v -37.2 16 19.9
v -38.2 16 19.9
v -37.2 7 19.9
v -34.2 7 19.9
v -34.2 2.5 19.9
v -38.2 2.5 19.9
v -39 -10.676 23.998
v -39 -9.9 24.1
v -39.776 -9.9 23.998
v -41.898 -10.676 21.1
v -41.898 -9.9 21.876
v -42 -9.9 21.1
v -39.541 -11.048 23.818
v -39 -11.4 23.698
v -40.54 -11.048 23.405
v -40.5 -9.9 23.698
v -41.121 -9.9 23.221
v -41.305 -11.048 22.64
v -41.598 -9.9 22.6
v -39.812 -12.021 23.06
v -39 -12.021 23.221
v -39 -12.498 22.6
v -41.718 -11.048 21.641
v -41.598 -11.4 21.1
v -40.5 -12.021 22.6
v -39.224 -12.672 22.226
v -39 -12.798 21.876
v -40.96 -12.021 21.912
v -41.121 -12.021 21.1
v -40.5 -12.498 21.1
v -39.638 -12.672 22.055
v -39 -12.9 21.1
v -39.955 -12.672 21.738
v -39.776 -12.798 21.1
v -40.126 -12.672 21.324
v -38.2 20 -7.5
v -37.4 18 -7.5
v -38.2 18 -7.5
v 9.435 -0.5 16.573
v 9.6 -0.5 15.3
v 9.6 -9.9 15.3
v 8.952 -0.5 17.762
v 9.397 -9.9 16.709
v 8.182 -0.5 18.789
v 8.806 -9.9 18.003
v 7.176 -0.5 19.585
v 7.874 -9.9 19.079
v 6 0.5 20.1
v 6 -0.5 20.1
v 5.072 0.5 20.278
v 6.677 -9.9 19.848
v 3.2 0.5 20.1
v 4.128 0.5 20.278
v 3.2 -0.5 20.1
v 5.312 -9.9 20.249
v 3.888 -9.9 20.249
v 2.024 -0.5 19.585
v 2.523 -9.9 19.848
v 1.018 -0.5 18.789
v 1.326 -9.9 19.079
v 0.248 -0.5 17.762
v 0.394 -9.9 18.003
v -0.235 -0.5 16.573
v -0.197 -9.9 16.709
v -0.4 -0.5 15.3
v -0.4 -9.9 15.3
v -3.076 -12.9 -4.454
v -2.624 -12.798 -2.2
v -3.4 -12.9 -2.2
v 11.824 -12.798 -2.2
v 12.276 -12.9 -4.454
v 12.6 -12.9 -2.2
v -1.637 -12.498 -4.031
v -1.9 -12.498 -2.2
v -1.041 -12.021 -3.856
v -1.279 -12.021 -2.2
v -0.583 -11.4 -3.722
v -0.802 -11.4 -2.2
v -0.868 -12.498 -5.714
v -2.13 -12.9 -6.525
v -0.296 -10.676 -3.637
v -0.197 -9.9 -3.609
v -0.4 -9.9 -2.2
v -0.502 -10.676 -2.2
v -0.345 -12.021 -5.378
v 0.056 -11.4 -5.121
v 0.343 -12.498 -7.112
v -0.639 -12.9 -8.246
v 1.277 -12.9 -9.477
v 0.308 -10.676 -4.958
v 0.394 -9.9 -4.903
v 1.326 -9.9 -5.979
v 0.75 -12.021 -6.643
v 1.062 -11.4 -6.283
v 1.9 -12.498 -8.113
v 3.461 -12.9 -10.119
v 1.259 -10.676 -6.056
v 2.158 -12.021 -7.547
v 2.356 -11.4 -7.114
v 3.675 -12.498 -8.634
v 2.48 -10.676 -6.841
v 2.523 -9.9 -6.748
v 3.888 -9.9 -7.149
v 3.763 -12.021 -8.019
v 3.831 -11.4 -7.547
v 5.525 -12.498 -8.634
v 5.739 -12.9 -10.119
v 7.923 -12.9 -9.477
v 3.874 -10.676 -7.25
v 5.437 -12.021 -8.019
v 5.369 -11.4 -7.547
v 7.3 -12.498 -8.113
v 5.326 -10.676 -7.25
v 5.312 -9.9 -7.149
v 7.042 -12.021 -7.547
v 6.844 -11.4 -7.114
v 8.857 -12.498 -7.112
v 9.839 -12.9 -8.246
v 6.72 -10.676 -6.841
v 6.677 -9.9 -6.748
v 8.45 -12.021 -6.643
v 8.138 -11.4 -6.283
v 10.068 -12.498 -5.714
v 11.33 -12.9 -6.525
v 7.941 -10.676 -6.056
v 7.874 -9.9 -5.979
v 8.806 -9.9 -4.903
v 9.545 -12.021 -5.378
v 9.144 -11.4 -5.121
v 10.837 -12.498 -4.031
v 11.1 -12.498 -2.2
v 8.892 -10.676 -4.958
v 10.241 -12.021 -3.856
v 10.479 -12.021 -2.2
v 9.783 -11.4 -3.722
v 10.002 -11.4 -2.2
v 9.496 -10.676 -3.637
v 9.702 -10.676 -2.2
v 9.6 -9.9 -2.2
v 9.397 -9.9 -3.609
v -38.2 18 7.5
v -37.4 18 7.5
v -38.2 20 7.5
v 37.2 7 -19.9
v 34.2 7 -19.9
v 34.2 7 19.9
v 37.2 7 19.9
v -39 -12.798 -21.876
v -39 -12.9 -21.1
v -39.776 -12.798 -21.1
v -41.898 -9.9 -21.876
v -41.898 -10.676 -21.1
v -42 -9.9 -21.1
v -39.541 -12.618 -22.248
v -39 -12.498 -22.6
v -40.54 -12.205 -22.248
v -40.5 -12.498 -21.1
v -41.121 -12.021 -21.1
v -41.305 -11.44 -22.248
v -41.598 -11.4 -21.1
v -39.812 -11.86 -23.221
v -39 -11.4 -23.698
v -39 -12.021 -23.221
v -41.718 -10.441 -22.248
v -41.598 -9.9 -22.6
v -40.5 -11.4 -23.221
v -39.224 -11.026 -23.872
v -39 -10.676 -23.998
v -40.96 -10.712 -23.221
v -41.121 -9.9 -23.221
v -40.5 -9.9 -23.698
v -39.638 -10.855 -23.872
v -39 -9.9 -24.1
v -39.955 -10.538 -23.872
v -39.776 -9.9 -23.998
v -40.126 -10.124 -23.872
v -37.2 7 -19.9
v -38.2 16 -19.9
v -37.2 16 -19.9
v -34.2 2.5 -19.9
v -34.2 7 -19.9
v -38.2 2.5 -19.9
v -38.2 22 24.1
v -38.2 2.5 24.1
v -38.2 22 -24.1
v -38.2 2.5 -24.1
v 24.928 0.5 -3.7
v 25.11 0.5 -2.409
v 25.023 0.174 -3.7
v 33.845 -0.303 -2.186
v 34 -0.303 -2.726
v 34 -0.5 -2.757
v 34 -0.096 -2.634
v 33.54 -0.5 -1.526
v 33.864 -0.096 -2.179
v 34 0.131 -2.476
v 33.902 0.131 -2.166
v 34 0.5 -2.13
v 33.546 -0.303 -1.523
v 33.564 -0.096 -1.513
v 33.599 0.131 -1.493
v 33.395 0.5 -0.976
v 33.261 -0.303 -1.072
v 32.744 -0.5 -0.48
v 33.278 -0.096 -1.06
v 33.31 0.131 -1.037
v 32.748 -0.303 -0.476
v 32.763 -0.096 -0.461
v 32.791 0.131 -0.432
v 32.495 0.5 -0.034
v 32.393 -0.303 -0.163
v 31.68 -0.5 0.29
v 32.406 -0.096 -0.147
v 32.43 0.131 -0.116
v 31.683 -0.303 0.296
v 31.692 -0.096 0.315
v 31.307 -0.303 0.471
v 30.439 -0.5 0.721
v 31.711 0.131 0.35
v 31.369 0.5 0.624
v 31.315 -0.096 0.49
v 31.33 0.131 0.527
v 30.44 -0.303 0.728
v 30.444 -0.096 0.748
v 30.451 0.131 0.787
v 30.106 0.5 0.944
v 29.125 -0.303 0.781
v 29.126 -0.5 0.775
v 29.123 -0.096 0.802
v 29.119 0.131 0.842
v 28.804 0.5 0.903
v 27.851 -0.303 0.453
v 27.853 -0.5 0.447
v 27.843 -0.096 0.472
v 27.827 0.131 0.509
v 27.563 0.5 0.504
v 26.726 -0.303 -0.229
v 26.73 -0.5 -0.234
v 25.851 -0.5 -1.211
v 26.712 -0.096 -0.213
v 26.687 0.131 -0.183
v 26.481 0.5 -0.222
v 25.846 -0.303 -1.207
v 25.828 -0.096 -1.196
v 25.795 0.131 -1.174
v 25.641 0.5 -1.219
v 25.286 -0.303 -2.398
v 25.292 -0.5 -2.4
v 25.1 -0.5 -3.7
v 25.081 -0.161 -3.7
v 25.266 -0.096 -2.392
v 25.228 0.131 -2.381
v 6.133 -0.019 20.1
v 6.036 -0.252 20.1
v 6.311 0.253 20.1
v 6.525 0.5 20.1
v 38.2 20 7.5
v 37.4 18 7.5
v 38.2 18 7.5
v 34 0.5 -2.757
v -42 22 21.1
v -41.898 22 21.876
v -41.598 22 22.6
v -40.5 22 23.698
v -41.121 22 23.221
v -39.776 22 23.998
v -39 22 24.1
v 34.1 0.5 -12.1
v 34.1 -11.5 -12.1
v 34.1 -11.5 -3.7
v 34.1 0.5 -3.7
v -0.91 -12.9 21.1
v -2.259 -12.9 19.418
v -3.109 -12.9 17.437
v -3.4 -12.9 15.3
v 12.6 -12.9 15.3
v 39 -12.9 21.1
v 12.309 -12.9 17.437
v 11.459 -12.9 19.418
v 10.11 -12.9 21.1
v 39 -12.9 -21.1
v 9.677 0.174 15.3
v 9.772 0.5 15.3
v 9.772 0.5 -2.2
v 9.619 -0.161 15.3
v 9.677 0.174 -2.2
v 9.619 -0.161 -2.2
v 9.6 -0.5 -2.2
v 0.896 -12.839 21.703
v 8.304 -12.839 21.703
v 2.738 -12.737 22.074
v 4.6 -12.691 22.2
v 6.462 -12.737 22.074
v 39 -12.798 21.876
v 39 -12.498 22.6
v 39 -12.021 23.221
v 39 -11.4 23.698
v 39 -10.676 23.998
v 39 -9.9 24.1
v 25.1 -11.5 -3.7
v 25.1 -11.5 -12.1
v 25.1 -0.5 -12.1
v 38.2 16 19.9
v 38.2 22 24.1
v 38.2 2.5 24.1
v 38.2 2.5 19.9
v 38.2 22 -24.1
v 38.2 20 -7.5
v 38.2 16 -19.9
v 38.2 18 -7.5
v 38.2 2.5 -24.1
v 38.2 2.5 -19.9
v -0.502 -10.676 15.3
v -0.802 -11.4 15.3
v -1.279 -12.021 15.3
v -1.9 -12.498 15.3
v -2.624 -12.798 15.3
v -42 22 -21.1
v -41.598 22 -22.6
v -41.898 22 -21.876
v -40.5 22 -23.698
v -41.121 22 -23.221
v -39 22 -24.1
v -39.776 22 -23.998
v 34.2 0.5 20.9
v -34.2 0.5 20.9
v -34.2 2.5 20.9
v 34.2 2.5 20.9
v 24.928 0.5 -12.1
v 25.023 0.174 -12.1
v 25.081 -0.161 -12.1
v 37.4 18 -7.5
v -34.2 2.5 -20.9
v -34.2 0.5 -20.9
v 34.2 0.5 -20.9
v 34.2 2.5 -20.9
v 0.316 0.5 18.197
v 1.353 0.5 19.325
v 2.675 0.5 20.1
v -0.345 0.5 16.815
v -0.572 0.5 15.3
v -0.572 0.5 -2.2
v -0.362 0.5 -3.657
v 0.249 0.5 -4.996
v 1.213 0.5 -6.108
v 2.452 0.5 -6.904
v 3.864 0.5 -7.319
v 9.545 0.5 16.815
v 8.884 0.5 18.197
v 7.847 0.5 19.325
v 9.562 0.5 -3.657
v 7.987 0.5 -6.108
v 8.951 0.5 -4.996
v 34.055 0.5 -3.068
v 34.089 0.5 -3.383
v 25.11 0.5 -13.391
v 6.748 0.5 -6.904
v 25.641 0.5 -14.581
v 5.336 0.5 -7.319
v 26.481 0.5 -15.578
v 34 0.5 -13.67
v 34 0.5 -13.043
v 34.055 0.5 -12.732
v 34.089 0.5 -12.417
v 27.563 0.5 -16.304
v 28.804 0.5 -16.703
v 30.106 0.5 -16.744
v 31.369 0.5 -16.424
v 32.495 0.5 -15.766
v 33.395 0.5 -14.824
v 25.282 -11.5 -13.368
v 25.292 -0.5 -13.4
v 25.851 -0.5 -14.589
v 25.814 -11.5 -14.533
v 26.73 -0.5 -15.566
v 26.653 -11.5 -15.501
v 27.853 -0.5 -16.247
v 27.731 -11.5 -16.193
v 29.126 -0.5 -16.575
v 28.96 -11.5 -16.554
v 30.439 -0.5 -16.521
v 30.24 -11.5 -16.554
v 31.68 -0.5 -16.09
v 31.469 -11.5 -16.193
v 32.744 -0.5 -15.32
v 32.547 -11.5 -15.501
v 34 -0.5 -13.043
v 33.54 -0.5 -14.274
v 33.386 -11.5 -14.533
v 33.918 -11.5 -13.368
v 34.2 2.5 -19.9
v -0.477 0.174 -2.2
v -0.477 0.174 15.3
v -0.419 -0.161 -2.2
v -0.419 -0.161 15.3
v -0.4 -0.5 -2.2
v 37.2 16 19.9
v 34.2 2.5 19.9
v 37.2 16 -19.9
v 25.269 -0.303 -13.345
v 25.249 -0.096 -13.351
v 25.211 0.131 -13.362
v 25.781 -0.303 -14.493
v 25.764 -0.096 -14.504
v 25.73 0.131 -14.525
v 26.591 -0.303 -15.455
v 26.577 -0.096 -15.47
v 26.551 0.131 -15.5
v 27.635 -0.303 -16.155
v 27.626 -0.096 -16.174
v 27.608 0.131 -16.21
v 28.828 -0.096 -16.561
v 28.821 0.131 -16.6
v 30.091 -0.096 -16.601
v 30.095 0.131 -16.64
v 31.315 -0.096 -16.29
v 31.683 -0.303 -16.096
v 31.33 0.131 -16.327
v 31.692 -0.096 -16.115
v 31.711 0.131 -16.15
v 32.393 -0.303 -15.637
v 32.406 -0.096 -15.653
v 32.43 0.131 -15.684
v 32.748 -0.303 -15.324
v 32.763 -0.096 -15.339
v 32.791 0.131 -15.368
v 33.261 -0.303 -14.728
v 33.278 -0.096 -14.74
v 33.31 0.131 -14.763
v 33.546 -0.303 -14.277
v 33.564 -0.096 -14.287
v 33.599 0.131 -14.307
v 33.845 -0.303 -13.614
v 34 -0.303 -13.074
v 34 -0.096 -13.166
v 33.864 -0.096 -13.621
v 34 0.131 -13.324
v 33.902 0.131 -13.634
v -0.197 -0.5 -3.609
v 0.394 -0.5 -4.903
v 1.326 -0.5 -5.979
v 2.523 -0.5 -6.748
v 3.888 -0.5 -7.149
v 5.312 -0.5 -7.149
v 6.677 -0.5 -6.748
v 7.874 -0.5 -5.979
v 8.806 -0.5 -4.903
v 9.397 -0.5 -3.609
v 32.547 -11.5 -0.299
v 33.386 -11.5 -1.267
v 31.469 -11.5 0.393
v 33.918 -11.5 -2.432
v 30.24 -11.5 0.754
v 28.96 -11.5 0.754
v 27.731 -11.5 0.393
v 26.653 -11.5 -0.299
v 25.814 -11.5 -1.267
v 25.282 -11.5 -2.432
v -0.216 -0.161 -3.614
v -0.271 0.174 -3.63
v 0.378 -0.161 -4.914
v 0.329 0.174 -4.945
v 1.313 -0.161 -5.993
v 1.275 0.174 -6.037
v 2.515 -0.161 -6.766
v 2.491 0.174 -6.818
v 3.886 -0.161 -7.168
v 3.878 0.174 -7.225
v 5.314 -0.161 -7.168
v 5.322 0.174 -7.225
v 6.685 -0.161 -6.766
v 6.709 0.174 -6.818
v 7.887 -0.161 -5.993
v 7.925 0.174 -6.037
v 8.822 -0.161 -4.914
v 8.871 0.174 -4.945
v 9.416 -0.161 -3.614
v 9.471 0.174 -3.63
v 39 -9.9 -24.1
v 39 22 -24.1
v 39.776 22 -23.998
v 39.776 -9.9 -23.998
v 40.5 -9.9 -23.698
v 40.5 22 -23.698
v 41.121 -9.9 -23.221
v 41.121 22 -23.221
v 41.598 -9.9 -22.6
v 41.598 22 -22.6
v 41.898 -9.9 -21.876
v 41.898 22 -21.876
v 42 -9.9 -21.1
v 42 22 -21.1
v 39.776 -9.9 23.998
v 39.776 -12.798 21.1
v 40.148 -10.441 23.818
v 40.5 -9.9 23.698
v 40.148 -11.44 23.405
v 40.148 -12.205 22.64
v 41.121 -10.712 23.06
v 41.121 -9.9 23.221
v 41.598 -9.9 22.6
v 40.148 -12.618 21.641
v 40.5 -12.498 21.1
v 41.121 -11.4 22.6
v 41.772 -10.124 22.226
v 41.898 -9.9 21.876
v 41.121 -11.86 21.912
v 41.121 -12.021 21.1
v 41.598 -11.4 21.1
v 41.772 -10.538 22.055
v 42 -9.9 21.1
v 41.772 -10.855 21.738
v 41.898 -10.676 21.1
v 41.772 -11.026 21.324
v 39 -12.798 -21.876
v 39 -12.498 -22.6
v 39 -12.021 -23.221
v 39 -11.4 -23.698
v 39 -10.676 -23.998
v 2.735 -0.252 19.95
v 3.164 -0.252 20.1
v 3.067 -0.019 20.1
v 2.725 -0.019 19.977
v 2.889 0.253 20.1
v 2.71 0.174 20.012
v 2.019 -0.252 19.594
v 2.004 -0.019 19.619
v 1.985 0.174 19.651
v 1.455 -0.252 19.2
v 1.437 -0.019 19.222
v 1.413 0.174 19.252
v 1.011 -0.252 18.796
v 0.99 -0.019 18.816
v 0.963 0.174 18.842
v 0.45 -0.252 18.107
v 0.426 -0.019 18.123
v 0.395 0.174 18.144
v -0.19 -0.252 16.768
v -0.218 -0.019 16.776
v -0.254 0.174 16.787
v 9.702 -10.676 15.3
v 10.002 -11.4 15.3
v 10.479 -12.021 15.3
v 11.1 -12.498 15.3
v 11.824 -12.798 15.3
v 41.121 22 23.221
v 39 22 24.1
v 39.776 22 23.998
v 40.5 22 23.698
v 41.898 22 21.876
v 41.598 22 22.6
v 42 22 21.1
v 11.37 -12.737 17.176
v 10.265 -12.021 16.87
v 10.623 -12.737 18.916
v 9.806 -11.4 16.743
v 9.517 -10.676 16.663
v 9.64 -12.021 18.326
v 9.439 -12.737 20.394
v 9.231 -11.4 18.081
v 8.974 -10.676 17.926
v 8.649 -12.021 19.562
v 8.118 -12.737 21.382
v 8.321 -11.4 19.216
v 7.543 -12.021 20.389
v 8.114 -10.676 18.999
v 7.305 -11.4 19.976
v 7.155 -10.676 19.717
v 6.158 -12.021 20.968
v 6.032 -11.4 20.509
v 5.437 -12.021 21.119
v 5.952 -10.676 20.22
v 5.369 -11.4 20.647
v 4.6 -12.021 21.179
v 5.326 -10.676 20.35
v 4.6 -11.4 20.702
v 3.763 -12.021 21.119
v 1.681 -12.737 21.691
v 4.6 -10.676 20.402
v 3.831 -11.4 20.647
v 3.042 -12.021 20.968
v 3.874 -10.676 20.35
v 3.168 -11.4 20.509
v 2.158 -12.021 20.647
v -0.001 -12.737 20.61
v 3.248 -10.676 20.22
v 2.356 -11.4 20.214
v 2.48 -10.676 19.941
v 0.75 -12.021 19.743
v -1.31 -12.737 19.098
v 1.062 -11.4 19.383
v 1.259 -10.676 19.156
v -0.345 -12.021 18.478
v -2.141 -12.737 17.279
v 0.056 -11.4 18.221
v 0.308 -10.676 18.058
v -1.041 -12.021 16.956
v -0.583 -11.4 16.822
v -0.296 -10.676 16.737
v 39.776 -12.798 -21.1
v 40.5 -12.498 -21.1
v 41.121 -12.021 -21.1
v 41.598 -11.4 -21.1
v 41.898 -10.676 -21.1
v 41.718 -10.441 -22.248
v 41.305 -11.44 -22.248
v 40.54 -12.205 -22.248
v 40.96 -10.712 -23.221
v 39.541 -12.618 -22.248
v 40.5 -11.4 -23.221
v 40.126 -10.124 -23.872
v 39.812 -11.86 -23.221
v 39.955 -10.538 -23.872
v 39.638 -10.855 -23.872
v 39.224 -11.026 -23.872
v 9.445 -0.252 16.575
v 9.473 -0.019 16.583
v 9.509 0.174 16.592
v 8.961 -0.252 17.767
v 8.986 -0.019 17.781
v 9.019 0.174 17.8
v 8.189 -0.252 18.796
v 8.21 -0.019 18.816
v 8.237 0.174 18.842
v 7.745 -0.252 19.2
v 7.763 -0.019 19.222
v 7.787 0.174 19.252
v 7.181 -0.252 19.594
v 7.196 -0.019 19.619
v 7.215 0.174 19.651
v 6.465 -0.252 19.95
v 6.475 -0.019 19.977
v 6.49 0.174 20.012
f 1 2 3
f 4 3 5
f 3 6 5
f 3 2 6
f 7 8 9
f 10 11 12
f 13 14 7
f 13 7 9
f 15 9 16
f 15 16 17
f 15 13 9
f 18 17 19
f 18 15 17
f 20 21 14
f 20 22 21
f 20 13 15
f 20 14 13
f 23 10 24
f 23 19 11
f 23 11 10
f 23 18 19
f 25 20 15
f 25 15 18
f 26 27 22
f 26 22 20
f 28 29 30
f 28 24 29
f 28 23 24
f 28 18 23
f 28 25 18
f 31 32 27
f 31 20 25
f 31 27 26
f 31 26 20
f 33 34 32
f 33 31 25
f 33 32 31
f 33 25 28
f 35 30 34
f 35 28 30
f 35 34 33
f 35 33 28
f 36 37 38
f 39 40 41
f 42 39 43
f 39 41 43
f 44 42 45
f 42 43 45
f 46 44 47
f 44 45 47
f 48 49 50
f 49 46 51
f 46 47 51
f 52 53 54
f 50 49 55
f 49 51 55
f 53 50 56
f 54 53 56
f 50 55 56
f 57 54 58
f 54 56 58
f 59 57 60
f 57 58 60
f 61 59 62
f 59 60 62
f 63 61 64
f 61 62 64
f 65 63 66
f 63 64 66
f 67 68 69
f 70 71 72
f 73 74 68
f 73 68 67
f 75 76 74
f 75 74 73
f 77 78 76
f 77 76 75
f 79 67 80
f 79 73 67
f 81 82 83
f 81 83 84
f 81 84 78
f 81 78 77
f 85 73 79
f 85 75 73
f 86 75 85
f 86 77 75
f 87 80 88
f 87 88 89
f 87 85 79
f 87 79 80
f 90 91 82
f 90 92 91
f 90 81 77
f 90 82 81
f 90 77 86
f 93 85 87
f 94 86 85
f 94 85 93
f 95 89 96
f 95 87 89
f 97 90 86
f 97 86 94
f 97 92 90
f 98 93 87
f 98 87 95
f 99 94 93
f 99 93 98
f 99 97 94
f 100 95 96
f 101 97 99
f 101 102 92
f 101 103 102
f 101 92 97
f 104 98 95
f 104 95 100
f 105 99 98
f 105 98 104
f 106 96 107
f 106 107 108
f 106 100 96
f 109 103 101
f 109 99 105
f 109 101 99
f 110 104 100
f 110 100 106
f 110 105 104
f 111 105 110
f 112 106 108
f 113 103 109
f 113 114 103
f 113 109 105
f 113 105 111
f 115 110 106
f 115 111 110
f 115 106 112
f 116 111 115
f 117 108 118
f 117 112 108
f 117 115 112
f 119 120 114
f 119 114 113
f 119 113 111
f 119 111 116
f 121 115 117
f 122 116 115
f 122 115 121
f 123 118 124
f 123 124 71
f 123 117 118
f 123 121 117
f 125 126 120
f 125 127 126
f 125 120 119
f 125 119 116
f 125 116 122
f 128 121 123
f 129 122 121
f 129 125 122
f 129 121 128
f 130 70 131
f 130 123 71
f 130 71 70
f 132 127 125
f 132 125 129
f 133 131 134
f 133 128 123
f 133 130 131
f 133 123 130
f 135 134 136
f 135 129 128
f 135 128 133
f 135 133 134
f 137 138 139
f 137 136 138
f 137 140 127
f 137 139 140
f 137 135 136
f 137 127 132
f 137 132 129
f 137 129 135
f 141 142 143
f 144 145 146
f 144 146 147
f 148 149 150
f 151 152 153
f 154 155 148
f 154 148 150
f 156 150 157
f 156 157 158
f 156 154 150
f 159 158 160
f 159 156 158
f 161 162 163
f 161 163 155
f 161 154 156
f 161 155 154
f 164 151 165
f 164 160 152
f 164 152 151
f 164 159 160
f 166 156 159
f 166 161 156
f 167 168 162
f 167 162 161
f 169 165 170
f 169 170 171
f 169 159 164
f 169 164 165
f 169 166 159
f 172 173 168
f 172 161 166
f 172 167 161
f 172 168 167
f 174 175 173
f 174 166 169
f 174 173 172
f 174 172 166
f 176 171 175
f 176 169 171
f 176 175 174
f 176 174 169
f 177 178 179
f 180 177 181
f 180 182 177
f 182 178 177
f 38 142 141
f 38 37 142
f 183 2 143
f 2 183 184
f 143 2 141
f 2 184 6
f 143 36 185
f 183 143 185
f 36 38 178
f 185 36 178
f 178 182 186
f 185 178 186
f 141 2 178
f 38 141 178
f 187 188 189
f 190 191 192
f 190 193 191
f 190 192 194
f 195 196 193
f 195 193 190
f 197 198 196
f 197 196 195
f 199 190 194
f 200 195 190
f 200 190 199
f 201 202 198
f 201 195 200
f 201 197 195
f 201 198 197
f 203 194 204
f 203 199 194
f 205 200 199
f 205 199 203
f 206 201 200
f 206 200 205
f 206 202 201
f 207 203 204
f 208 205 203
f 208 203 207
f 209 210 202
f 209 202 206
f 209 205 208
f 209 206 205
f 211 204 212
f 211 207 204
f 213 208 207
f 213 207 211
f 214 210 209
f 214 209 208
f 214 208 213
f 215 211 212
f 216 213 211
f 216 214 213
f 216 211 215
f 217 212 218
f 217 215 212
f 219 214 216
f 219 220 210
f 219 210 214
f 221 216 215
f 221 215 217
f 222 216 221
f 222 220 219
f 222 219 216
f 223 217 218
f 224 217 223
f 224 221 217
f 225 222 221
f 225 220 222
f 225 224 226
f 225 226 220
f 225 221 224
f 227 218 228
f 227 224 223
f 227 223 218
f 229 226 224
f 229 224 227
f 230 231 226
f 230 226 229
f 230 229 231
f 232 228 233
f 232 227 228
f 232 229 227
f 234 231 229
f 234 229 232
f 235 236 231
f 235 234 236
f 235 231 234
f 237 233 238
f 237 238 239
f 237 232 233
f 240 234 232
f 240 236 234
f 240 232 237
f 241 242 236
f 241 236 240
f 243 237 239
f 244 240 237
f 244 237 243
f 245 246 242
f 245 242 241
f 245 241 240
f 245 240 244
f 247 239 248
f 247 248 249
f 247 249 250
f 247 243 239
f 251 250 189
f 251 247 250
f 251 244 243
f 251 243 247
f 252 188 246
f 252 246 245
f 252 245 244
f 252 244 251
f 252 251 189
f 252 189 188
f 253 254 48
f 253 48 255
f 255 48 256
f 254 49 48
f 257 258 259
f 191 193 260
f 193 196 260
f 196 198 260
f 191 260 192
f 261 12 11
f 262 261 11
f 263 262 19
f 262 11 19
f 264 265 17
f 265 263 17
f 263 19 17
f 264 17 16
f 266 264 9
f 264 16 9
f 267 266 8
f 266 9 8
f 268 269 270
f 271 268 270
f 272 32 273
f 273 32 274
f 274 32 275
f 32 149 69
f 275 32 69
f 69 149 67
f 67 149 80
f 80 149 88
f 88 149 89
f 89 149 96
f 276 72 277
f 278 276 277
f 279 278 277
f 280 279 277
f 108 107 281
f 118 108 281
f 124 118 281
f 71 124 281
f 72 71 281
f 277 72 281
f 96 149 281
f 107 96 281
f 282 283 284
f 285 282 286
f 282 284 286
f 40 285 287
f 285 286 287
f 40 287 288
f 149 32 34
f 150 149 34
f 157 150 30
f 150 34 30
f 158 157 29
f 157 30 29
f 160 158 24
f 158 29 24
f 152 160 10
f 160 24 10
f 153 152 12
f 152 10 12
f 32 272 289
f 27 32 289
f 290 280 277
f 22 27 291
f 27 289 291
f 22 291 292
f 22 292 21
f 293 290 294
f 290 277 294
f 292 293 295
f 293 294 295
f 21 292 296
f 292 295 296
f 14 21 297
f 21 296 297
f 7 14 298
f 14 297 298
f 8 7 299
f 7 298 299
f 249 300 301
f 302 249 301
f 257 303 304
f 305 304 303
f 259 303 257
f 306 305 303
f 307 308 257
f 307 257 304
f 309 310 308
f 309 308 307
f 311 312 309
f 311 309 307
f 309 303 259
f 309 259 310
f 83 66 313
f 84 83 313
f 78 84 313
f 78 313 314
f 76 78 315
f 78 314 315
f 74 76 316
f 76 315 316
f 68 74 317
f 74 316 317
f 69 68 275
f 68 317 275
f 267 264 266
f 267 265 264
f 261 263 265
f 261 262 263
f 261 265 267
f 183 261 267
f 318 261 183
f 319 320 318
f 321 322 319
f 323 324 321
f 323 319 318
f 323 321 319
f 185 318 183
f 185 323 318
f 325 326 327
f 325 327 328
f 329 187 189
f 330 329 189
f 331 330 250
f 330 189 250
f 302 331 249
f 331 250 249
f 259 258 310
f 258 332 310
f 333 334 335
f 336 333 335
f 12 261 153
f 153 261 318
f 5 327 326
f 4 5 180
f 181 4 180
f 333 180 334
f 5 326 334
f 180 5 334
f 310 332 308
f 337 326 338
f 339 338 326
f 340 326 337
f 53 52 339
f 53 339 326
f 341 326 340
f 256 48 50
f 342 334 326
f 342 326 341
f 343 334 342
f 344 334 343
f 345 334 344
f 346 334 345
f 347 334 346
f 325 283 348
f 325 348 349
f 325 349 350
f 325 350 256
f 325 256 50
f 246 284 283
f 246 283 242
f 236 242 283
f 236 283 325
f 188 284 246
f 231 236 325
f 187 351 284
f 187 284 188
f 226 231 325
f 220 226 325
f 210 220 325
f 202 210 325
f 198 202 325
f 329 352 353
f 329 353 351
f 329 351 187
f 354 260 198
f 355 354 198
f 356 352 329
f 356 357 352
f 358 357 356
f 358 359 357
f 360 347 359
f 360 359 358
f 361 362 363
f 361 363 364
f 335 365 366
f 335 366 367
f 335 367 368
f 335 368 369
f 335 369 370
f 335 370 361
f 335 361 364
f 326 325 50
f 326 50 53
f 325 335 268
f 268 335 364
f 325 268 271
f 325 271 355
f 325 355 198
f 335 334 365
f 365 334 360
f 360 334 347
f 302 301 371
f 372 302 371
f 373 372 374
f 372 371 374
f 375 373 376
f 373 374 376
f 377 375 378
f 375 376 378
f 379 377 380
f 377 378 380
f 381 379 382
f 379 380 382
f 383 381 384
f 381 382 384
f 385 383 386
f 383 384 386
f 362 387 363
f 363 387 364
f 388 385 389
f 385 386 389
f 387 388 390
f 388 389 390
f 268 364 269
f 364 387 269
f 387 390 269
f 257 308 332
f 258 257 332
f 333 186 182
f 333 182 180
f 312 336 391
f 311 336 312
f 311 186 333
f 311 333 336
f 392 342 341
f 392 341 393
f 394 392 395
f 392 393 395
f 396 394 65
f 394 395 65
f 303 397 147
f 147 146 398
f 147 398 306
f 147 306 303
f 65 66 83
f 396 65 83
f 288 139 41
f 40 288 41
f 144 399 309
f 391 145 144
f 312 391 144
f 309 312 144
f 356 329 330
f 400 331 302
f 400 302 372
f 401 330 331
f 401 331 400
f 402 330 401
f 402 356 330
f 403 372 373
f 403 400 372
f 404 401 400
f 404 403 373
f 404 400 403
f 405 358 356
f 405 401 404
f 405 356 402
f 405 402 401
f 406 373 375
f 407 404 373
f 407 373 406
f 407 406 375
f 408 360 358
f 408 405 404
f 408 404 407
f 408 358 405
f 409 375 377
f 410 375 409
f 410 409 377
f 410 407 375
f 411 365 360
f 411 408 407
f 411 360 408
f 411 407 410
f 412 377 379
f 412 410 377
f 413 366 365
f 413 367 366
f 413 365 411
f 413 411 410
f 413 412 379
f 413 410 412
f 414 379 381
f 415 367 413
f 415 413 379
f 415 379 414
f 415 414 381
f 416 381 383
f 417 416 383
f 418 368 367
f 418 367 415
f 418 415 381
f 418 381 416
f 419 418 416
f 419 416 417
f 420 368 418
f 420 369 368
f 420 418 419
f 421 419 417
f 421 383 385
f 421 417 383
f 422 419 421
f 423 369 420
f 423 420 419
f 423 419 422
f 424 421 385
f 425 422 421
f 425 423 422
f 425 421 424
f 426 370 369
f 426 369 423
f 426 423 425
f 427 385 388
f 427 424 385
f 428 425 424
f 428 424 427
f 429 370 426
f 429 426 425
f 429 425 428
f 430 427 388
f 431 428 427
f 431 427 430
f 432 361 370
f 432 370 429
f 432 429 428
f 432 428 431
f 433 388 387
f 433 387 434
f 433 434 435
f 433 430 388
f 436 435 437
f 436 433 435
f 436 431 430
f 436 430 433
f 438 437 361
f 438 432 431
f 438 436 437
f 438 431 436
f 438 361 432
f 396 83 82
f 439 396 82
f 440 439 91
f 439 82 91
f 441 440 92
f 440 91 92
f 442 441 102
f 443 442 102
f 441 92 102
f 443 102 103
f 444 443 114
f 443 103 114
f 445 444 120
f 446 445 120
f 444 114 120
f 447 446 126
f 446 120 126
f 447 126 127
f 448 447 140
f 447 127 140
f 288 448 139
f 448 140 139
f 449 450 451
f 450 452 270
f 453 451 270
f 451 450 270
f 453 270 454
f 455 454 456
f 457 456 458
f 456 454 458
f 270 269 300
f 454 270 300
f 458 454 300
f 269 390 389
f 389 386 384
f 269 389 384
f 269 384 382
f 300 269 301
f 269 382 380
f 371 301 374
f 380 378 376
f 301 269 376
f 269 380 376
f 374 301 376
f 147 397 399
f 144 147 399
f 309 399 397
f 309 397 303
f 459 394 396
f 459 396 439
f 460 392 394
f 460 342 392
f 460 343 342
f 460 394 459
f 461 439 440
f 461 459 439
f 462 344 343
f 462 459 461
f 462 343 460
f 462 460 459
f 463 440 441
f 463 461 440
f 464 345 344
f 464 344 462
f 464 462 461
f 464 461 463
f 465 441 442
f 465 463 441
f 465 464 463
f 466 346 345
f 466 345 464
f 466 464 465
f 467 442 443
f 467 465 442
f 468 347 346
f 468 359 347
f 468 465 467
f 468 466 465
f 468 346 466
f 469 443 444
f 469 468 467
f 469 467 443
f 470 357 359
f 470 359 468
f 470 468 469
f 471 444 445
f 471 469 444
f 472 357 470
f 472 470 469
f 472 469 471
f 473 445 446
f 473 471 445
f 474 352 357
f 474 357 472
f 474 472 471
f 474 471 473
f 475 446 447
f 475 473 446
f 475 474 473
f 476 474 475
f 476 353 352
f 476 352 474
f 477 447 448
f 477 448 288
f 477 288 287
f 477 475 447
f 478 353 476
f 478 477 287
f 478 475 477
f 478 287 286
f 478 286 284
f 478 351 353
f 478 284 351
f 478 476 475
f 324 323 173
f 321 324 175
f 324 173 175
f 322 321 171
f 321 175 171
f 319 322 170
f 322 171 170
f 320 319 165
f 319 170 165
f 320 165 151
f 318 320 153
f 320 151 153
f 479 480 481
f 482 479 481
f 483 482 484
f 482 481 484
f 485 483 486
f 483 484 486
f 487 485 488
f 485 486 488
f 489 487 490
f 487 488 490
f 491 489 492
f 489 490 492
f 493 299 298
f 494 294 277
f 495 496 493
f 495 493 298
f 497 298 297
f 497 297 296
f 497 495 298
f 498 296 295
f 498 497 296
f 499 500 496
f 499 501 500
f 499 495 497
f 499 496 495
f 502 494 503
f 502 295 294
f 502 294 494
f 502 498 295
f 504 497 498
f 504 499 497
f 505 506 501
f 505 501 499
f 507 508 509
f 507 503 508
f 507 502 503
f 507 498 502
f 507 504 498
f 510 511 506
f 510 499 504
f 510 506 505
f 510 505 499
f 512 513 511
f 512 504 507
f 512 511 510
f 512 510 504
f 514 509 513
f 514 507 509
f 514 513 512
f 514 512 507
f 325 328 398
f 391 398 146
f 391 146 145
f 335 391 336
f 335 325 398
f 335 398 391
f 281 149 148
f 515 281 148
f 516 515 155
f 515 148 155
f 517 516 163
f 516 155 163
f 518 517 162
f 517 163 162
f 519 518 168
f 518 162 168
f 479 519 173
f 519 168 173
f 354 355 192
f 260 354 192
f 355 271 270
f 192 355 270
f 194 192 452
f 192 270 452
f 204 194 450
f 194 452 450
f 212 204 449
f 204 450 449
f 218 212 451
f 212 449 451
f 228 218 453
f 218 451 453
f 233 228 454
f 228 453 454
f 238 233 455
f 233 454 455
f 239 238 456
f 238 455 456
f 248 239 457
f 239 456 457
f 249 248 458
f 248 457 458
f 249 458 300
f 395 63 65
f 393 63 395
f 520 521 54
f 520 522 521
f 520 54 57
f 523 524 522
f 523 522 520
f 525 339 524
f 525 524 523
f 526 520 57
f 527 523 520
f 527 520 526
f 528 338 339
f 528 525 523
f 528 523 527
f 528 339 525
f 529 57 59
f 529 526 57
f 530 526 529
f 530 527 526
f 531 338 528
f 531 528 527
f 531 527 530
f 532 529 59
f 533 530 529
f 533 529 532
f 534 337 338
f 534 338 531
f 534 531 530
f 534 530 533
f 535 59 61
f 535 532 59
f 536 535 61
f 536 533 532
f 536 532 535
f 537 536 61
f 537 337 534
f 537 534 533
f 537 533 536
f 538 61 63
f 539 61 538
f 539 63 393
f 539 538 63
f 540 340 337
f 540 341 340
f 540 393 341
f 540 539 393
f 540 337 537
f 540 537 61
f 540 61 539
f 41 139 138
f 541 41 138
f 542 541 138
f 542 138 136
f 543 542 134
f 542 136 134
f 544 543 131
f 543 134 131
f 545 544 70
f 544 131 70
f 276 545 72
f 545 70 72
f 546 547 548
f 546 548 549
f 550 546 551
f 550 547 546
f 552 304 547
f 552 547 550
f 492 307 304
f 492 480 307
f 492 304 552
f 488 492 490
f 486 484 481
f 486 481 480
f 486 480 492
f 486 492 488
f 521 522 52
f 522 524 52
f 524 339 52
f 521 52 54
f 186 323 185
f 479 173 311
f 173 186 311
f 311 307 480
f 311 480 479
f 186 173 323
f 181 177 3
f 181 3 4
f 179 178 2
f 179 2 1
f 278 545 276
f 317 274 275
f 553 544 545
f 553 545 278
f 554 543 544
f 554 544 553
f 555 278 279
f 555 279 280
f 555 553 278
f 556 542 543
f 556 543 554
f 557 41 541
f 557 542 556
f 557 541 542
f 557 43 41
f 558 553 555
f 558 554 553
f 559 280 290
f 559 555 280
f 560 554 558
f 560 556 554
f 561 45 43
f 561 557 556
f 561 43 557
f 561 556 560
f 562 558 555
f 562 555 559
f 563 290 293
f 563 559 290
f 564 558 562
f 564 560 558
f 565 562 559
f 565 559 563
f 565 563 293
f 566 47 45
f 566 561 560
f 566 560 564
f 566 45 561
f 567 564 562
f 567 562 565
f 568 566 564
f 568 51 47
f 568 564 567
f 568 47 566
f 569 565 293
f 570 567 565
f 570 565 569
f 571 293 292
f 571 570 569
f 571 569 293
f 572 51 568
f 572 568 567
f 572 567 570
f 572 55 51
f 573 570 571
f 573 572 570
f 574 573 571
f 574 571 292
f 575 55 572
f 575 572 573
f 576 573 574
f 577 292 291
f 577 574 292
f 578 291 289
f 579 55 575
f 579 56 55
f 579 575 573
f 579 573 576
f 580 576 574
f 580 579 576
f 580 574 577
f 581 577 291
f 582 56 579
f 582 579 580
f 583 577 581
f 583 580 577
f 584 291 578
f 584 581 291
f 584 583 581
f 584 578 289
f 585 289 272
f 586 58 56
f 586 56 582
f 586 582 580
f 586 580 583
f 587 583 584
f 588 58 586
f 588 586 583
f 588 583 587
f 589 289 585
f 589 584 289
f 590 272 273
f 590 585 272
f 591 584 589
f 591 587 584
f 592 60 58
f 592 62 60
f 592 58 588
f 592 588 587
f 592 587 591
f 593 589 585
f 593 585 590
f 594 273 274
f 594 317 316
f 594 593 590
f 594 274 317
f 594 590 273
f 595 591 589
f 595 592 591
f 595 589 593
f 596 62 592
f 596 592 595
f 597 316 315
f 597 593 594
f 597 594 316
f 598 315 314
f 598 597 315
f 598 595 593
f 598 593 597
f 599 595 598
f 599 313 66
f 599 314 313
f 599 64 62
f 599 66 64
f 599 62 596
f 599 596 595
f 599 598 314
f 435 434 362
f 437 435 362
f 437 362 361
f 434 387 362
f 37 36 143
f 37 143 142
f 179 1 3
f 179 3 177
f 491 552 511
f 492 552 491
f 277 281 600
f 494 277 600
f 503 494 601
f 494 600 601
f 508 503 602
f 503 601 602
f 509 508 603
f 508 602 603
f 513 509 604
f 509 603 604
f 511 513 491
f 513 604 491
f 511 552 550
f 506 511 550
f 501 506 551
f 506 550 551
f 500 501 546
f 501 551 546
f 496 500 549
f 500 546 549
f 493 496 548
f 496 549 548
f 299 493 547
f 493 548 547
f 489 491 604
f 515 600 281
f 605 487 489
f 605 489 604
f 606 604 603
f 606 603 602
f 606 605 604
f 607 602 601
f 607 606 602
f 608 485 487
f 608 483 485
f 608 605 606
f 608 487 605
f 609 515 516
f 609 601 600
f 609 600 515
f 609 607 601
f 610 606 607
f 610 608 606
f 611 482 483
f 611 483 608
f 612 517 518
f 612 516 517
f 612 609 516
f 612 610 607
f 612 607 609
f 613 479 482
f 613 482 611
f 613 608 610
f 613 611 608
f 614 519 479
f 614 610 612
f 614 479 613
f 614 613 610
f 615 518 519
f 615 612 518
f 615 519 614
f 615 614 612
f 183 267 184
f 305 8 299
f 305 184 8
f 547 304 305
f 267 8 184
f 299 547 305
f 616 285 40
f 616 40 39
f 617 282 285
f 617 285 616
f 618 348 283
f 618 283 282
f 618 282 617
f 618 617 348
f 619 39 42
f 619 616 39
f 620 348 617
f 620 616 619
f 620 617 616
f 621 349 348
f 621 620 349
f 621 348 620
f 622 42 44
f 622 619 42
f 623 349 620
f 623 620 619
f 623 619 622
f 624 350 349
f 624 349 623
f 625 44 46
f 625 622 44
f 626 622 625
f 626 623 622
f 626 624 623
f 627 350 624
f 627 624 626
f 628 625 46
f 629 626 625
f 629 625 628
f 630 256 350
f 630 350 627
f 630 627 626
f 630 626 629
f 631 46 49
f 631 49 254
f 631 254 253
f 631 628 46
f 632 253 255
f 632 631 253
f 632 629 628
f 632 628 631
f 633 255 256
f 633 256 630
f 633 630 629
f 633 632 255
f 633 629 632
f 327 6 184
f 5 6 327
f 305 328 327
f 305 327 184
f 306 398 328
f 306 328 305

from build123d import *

# Parameters (mm, degrees)
SKETCH2_W               = 84
SKETCH2_H               = 48.2
BOSS_EXTRUDE1_DEPTH     = 3
SKETCH3_W               = 3.8
SKETCH3_H               = 48.2
BOSS_EXTRUDE2_DEPTH     = 19
SKETCH4_W               = 4
SKETCH4_H               = 48.2
BOSS_EXTRUDE3_DEPTH     = 13
BOSS_EXTRUDE4_DEPTH     = 7.5
SKETCH6_W               = 3
SKETCH6_H               = 48.2
CUT_EXTRUDE1_DEPTH      = 9
SKETCH7_W               = 68
SKETCH7_H               = 40.2
CUT_EXTRUDE2_DEPTH      = 0.5
SKETCH9_W               = 84
SKETCH9_H               = 48.2
BOSS_EXTRUDE5_DEPTH     = 15.4
CUT_EXTRUDE3_DEPTH      = 53.202107237
CUT_EXTRUDE3_DEPTH_BACK = 14
CUT_EXTRUDE4_DEPTH      = 53.202107237
CUT_EXTRUDE4_DEPTH_BACK = 53.202107237
FILLET1_R               = 3
SKETCH12_W              = 76.4
SKETCH12_H              = 4.2
CUT_EXTRUDE5_DEPTH      = 20
CUT_EXTRUDE6_DEPTH      = 53.202107283
CUT_EXTRUDE6_DEPTH_BACK = 2
SKETCH13_W              = 68.4
SKETCH13_H              = 41.8


with BuildPart() as part:
    # Sketch2 → Boss-Extrude1 (new body)
    with BuildSketch(Plane(origin=(0, 0, 0), x_dir=(1, 0, 0), z_dir=(0, 1, 0))):
        Rectangle(SKETCH2_W, SKETCH2_H)
    extrude(amount=BOSS_EXTRUDE1_DEPTH)

    # Sketch3 → Boss-Extrude2 (add)
    with BuildSketch(Plane(origin=(0, 3, 0), x_dir=(1, 0, 0), z_dir=(0, 1, 0))):
        with Locations((-40.1, 0)):
            Rectangle(SKETCH3_W, SKETCH3_H)
        with Locations((40.1, 0)):
            Rectangle(SKETCH3_W, SKETCH3_H)
    extrude(amount=BOSS_EXTRUDE2_DEPTH)

    # Sketch4 → Boss-Extrude3 (add)
    with BuildSketch(Plane(origin=(0, 3, 0), x_dir=(1, 0, 0), z_dir=(0, 1, 0))):
        with Locations((-36.2, 0)):
            Rectangle(SKETCH4_W, SKETCH4_H)
        with Locations((36.2, 0)):
            Rectangle(SKETCH4_W, SKETCH4_H)
    extrude(amount=BOSS_EXTRUDE3_DEPTH)

    # Sketch5 → Boss-Extrude4 (add, symmetric)
    with BuildSketch(Plane(origin=(0, 0, 0), x_dir=(-1, 0, 0), z_dir=(0, 0, -1))):
        Polygon((-38.2, 20), (-37.4, 18), (-38.2, 18), align=None)
    boss_extrude4 = extrude(amount=BOSS_EXTRUDE4_DEPTH, both=True)

    # Sketch6 → Cut-Extrude1 (cut)
    with BuildSketch(Plane(origin=(0, 16, 0), x_dir=(1, 0, 0), z_dir=(0, 1, 0))):
        with Locations((35.7, 0)):
            Rectangle(SKETCH6_W, SKETCH6_H)
        with Locations((-35.7, 0)):
            Rectangle(SKETCH6_W, SKETCH6_H)
    extrude(amount=-CUT_EXTRUDE1_DEPTH, mode=Mode.SUBTRACT)

    # Mirror1: Boss-Extrude4 across plane
    add(boss_extrude4.mirror(Plane(origin=(0, 0, 0), x_dir=(0, 0, 1), z_dir=(1, 0, 0))))

    # Sketch7 → Cut-Extrude2 (cut)
    with BuildSketch(Plane(origin=(0, 3, 0), x_dir=(1, 0, 0), z_dir=(0, 1, 0))):
        Rectangle(SKETCH7_W, SKETCH7_H)
    extrude(amount=-CUT_EXTRUDE2_DEPTH, mode=Mode.SUBTRACT)

    # Sketch9 → Boss-Extrude5 (add)
    with BuildSketch(Plane(origin=(0, 2.5, 0), x_dir=(1, 0, 0), z_dir=(0, 1, 0))):
        Rectangle(SKETCH9_W, SKETCH9_H)
    extrude(amount=-BOSS_EXTRUDE5_DEPTH)

    # Sketch10 → Cut-Extrude3 (cut, two sides: drawn at the far end of the back side and taken through both)
    with BuildSketch(Plane(origin=(0, 2.5, 0), x_dir=(1, 0, 0), z_dir=(0, 1, 0)).offset(-CUT_EXTRUDE3_DEPTH_BACK)):
        with BuildLine():
            Line((25.1, 3.7), (25.1, 12.1))
            ThreePointArc((25.1, 12.1), (29.6, 16.6), (34.1, 12.1))
            Line((34.1, 12.1), (34.1, 3.7))
            ThreePointArc((34.1, 3.7), (29.6, -0.8), (25.1, 3.7))
        make_face()
    extrude(amount=CUT_EXTRUDE3_DEPTH + CUT_EXTRUDE3_DEPTH_BACK, mode=Mode.SUBTRACT)

    # Sketch11 → Cut-Extrude4 (cut, two sides: drawn at the far end of the back side and taken through both)
    with BuildSketch(Plane(origin=(0, 2.5, 0), x_dir=(1, 0, 0), z_dir=(0, 1, 0)).offset(-CUT_EXTRUDE4_DEPTH_BACK)):
        with BuildLine():
            Line((9.6, 2.2), (9.6, -15.3))
            ThreePointArc((9.6, -15.3), (4.6, -20.3), (-0.4, -15.3))
            Line((-0.4, -15.3), (-0.4, 2.2))
            ThreePointArc((-0.4, 2.2), (4.6, 7.2), (9.6, 2.2))
        make_face()
    extrude(amount=CUT_EXTRUDE4_DEPTH + CUT_EXTRUDE4_DEPTH_BACK, mode=Mode.SUBTRACT)

    # Fillet1
    # the kernel refuses this fillet: 3 mm, written as the material it takes off along each edge
    with BuildSketch(Plane(origin=(-39, -9.9, 21.1), x_dir=(-1, 0, 0), z_dir=(0, -1, 0))) as fillet1_piece_1_section:
        Polygon((0, 0), (FILLET1_R * 1.02, 0), (FILLET1_R * 1.02, -FILLET1_R * 1.02), (0, -FILLET1_R * 1.02), align=None)
    fillet1_piece_1 = extrude(amount=FILLET1_R * 1.02, mode=Mode.PRIVATE)
    fillet1_piece_1 = fillet1_piece_1 - Plane(origin=(-39, -9.9, 21.1), x_dir=(0.7071067811865475, 0, -0.7071067811865476), z_dir=(0, -1, 0)) * Sphere(FILLET1_R, mode=Mode.PRIVATE)
    add(fillet1_piece_1, mode=Mode.SUBTRACT)
    with BuildSketch(Plane(origin=(-39, -9.9, -21.1), x_dir=(0, -1, 0), z_dir=(0, 0, -1))) as fillet1_piece_2_section:
        Polygon((0, 0), (FILLET1_R * 1.02, 0), (FILLET1_R * 1.02, FILLET1_R * 1.02), (0, FILLET1_R * 1.02), align=None)
    fillet1_piece_2 = extrude(amount=FILLET1_R * 1.02, mode=Mode.PRIVATE)
    fillet1_piece_2 = fillet1_piece_2 - Plane(origin=(-39, -9.9, -21.1), x_dir=(0.7071067811865475, 0.7071067811865475, 0), z_dir=(0, 0, -1)) * Sphere(FILLET1_R, mode=Mode.PRIVATE)
    add(fillet1_piece_2, mode=Mode.SUBTRACT)
    with BuildSketch(Plane(origin=(39, -9.9, -21.1), x_dir=(0, -1, 0), z_dir=(0, 0, -1))) as fillet1_piece_3_section:
        Polygon((0, 0), (FILLET1_R * 1.02, 0), (FILLET1_R * 1.02, -FILLET1_R * 1.02), (0, -FILLET1_R * 1.02), align=None)
    fillet1_piece_3 = extrude(amount=FILLET1_R * 1.02, mode=Mode.PRIVATE)
    fillet1_piece_3 = fillet1_piece_3 - Plane(origin=(39, -9.9, -21.1), x_dir=(-0.7071067811865475, 0.7071067811865475, 0), z_dir=(0, 0, -1)) * Sphere(FILLET1_R, mode=Mode.PRIVATE)
    add(fillet1_piece_3, mode=Mode.SUBTRACT)
    with BuildSketch(Plane(origin=(39, -9.9, 21.1), x_dir=(0, -1, 0), z_dir=(1, 0, 0))) as fillet1_piece_4_section:
        Polygon((0, 0), (FILLET1_R * 1.02, 0), (FILLET1_R * 1.02, -FILLET1_R * 1.02), (0, -FILLET1_R * 1.02), align=None)
    fillet1_piece_4 = extrude(amount=FILLET1_R * 1.02, mode=Mode.PRIVATE)
    fillet1_piece_4 = fillet1_piece_4 - Plane(origin=(39, -9.9, 21.1), x_dir=(0, 0.7071067811865475, -0.7071067811865475), z_dir=(1, 0, 0)) * Sphere(FILLET1_R, mode=Mode.PRIVATE)
    add(fillet1_piece_4, mode=Mode.SUBTRACT)
    with BuildSketch(Plane(origin=(-42, -12.9, 21.1), x_dir=(1, 0, 0), z_dir=(0, 0, -1)), Plane(origin=(42, -12.9, -21.1), x_dir=(-1, 0, 0), z_dir=(0, 0, 1))) as fillet1_piece_5:
        with BuildLine():
            CenterArc((FILLET1_R, -FILLET1_R), FILLET1_R, 90, 90)
            Line((0, -FILLET1_R), (0, 0))
            Line((0, 0), (FILLET1_R, 0))
        make_face()
    extrude(amount=42.2, mode=Mode.SUBTRACT)
    with BuildSketch(Plane(origin=(-39, -12.9, -24.1), x_dir=(0, 1, 0), z_dir=(1, 0, 0))) as fillet1_piece_6:
        with BuildLine():
            CenterArc((FILLET1_R, FILLET1_R), FILLET1_R, 180, 90)
            Line((0, FILLET1_R), (0, 0))
            Line((0, 0), (FILLET1_R, 0))
        make_face()
    extrude(amount=78, mode=Mode.SUBTRACT)
    with BuildSketch(Plane(origin=(39, -12.9, 24.1), x_dir=(0, 0, -1), z_dir=(-1, 0, 0))) as fillet1_piece_7:
        with BuildLine():
            CenterArc((FILLET1_R, -FILLET1_R), FILLET1_R, 90, 90)
            Line((0, -FILLET1_R), (0, 0))
            Line((0, 0), (FILLET1_R, 0))
        make_face()
    extrude(amount=78, mode=Mode.SUBTRACT)
    with BuildSketch(Plane(origin=(25.1, 2.5, -3.7), x_dir=(-1, 0, 0), z_dir=(0, 0, -1))) as fillet1_piece_8:
        with BuildLine():
            CenterArc((FILLET1_R, -FILLET1_R), FILLET1_R, 90, 90)
            Line((0, -FILLET1_R), (0, 0))
            Line((0, 0), (FILLET1_R, 0))
        make_face()
    extrude(amount=8.4, mode=Mode.SUBTRACT)
    with BuildSketch(Plane(origin=(29.6, 2.5, -12.1), x_dir=(-1, 0, 0), z_dir=(0, 0, 1))) as fillet1_piece_9_section:
        with BuildLine():
            CenterArc((4.5 + FILLET1_R, FILLET1_R), FILLET1_R, 180, 90)
            Line((4.5 + FILLET1_R, 0), (4.5, 0))
            Line((4.5, 0), (4.5, FILLET1_R))
        make_face()
    fillet1_piece_9 = revolve(axis=Axis((29.6, 2.5, -12.1), (0, -1, 0)), revolution_arc=263.525069882, mode=Mode.PRIVATE)
    fillet1_piece_9 = split(fillet1_piece_9, bisect_by=Plane(origin=(34, 1.640934382, -17.429209867), z_dir=(-1, 0, 0)), keep=Keep.TOP, mode=Mode.PRIVATE)
    add(fillet1_piece_9, mode=Mode.SUBTRACT)
    with BuildSketch(Plane(origin=(29.6, 2.5, -3.7), x_dir=(0.11276846361504911, 0, -0.9936212928545268), z_dir=(-0.9936212928545268, 0, -0.11276846361504911))) as fillet1_piece_10_section:
        with BuildLine():
            CenterArc((4.5 + FILLET1_R, FILLET1_R), FILLET1_R, 180, 90)
            Line((4.5 + FILLET1_R, 0), (4.5, 0))
            Line((4.5, 0), (4.5, FILLET1_R))
        make_face()
    fillet1_piece_10 = revolve(axis=Axis((29.6, 2.5, -3.7), (0, -1, 0)), revolution_arc=263.525069882, mode=Mode.PRIVATE)
    fillet1_piece_10 = split(fillet1_piece_10, bisect_by=Plane(origin=(34, 1.640934386, 1.629209863), z_dir=(-1, 0, 0)), keep=Keep.TOP, mode=Mode.PRIVATE)
    add(fillet1_piece_10, mode=Mode.SUBTRACT)
    with BuildSketch(Plane(origin=(4.6, 2.5, -2.2), x_dir=(-1, 0, 0), z_dir=(0, 0, 1))) as fillet1_piece_11:
        with BuildLine():
            CenterArc((5 + FILLET1_R, FILLET1_R), FILLET1_R, 180, 90)
            Line((5 + FILLET1_R, 0), (5, 0))
            Line((5, 0), (5, FILLET1_R))
        make_face()
    revolve(axis=Axis((4.6, 2.5, -2.2), (0, -1, 0)), revolution_arc=180, mode=Mode.SUBTRACT)
    with BuildSketch(Plane(origin=(9.6, 2.5, -2.2), x_dir=(0, -1, 0), z_dir=(0, 0, 1)), Plane(origin=(-0.4, 2.5, 15.3), x_dir=(0, -1, 0), z_dir=(0, 0, -1)), Plane(origin=(9.6, -12.9, -2.2), x_dir=(1, 0, 0), z_dir=(0, 0, 1)), Plane(origin=(-0.4, -12.9, 15.3), x_dir=(-1, 0, 0), z_dir=(0, 0, -1))) as fillet1_piece_12:
        with BuildLine():
            CenterArc((FILLET1_R, FILLET1_R), FILLET1_R, 180, 90)
            Line((0, FILLET1_R), (0, 0))
            Line((0, 0), (FILLET1_R, 0))
        make_face()
    extrude(amount=17.5, mode=Mode.SUBTRACT)
    with BuildSketch(Plane(origin=(4.6, 2.5, 15.3), x_dir=(1, 0, 0), z_dir=(0, 0, -1))) as fillet1_piece_13_section:
        with BuildLine():
            CenterArc((5 + FILLET1_R, FILLET1_R), FILLET1_R, 180, 90)
            Line((5 + FILLET1_R, 0), (5, 0))
            Line((5, 0), (5, FILLET1_R))
        make_face()
    fillet1_piece_13 = revolve(axis=Axis((4.6, 2.5, 15.3), (0, -1, 0)), revolution_arc=159.706638681, mode=Mode.PRIVATE)
    fillet1_piece_13 = split(fillet1_piece_13, bisect_by=Plane(origin=(8.507236212, 1.653326519, 20.1), z_dir=(0, 0, -1)), keep=Keep.TOP, mode=Mode.PRIVATE)
    add(fillet1_piece_13, mode=Mode.SUBTRACT)
    with BuildSketch(Plane(origin=(4.6, 2.5, 15.3), x_dir=(0.9379291266520984, 0, 0.3468269790221515), z_dir=(0.3468269790221515, 0, -0.9379291266520984))) as fillet1_piece_14_section:
        with BuildLine():
            CenterArc((5 + FILLET1_R, FILLET1_R), FILLET1_R, 180, 90)
            Line((5 + FILLET1_R, 0), (5, 0))
            Line((5, 0), (5, FILLET1_R))
        make_face()
    fillet1_piece_14 = revolve(axis=Axis((4.6, 2.5, 15.3), (0, -1, 0)), revolution_arc=159.706638681, mode=Mode.PRIVATE)
    fillet1_piece_14 = split(fillet1_piece_14, bisect_by=Plane(origin=(8.773531285, 1.782701888, 20.1), z_dir=(0, 0, -1)), keep=Keep.TOP, mode=Mode.PRIVATE)
    add(fillet1_piece_14, mode=Mode.SUBTRACT)
    with BuildSketch(Plane(origin=(4.6, -12.9, -2.2), x_dir=(-1, 0, 0), z_dir=(0, 0, 1))) as fillet1_piece_15:
        with BuildLine():
            CenterArc((5 + FILLET1_R, -FILLET1_R), FILLET1_R, 90, 90)
            Line((5, -FILLET1_R), (5, 0))
            Line((5, 0), (5 + FILLET1_R, 0))
        make_face()
    revolve(axis=Axis((4.6, -12.9, -2.2), (0, -1, 0)), revolution_arc=180, mode=Mode.SUBTRACT)
    with BuildSketch(Plane(origin=(4.6, -12.9, 15.3), x_dir=(1, 0, 0), z_dir=(0, 0, -1))) as fillet1_piece_16:
        with BuildLine():
            CenterArc((5 + FILLET1_R, -FILLET1_R), FILLET1_R, 90, 90)
            Line((5, -FILLET1_R), (5, 0))
            Line((5, 0), (5 + FILLET1_R, 0))
        make_face()
    revolve(axis=Axis((4.6, -12.9, 15.3), (0, -1, 0)), revolution_arc=180, mode=Mode.SUBTRACT)
    with BuildSketch(Plane(origin=(-42, -9.9, -24.1), x_dir=(1, 0, 0), z_dir=(0, 1, 0)), Plane(origin=(42, 29.5, -24.1), x_dir=(-1, 0, 0), z_dir=(0, -1, 0)), Plane(origin=(42, 29.5, 24.1), x_dir=(0, 0, -1), z_dir=(0, -1, 0)), Plane(origin=(-42, -9.9, 24.1), x_dir=(0, 0, -1), z_dir=(0, 1, 0))) as fillet1_piece_17:
        with BuildLine():
            CenterArc((FILLET1_R, -FILLET1_R), FILLET1_R, 90, 90)
            Line((0, -FILLET1_R), (0, 0))
            Line((0, 0), (FILLET1_R, 0))
        make_face()
    extrude(amount=39.4, mode=Mode.SUBTRACT)

    # Sketch12 → Cut-Extrude5 (cut)
    with BuildSketch(Plane(origin=(0, 2.5, 0), x_dir=(1, 0, 0), z_dir=(0, 1, 0))):
        with Locations((0, 22)):
            Rectangle(SKETCH12_W, SKETCH12_H)
        with Locations((0, -22)):
            Rectangle(SKETCH12_W, SKETCH12_H)
    extrude(amount=CUT_EXTRUDE5_DEPTH, mode=Mode.SUBTRACT)

    # Sketch13 → Cut-Extrude6 (cut, two sides: drawn at the far end of the back side and taken through both)
    with BuildSketch(Plane(origin=(0, 2.5, 0), x_dir=(1, 0, 0), z_dir=(0, 1, 0)).offset(-CUT_EXTRUDE6_DEPTH_BACK)):
        Rectangle(SKETCH13_W, SKETCH13_H)
    extrude(amount=CUT_EXTRUDE6_DEPTH + CUT_EXTRUDE6_DEPTH_BACK, mode=Mode.SUBTRACT)


solid = part.part
